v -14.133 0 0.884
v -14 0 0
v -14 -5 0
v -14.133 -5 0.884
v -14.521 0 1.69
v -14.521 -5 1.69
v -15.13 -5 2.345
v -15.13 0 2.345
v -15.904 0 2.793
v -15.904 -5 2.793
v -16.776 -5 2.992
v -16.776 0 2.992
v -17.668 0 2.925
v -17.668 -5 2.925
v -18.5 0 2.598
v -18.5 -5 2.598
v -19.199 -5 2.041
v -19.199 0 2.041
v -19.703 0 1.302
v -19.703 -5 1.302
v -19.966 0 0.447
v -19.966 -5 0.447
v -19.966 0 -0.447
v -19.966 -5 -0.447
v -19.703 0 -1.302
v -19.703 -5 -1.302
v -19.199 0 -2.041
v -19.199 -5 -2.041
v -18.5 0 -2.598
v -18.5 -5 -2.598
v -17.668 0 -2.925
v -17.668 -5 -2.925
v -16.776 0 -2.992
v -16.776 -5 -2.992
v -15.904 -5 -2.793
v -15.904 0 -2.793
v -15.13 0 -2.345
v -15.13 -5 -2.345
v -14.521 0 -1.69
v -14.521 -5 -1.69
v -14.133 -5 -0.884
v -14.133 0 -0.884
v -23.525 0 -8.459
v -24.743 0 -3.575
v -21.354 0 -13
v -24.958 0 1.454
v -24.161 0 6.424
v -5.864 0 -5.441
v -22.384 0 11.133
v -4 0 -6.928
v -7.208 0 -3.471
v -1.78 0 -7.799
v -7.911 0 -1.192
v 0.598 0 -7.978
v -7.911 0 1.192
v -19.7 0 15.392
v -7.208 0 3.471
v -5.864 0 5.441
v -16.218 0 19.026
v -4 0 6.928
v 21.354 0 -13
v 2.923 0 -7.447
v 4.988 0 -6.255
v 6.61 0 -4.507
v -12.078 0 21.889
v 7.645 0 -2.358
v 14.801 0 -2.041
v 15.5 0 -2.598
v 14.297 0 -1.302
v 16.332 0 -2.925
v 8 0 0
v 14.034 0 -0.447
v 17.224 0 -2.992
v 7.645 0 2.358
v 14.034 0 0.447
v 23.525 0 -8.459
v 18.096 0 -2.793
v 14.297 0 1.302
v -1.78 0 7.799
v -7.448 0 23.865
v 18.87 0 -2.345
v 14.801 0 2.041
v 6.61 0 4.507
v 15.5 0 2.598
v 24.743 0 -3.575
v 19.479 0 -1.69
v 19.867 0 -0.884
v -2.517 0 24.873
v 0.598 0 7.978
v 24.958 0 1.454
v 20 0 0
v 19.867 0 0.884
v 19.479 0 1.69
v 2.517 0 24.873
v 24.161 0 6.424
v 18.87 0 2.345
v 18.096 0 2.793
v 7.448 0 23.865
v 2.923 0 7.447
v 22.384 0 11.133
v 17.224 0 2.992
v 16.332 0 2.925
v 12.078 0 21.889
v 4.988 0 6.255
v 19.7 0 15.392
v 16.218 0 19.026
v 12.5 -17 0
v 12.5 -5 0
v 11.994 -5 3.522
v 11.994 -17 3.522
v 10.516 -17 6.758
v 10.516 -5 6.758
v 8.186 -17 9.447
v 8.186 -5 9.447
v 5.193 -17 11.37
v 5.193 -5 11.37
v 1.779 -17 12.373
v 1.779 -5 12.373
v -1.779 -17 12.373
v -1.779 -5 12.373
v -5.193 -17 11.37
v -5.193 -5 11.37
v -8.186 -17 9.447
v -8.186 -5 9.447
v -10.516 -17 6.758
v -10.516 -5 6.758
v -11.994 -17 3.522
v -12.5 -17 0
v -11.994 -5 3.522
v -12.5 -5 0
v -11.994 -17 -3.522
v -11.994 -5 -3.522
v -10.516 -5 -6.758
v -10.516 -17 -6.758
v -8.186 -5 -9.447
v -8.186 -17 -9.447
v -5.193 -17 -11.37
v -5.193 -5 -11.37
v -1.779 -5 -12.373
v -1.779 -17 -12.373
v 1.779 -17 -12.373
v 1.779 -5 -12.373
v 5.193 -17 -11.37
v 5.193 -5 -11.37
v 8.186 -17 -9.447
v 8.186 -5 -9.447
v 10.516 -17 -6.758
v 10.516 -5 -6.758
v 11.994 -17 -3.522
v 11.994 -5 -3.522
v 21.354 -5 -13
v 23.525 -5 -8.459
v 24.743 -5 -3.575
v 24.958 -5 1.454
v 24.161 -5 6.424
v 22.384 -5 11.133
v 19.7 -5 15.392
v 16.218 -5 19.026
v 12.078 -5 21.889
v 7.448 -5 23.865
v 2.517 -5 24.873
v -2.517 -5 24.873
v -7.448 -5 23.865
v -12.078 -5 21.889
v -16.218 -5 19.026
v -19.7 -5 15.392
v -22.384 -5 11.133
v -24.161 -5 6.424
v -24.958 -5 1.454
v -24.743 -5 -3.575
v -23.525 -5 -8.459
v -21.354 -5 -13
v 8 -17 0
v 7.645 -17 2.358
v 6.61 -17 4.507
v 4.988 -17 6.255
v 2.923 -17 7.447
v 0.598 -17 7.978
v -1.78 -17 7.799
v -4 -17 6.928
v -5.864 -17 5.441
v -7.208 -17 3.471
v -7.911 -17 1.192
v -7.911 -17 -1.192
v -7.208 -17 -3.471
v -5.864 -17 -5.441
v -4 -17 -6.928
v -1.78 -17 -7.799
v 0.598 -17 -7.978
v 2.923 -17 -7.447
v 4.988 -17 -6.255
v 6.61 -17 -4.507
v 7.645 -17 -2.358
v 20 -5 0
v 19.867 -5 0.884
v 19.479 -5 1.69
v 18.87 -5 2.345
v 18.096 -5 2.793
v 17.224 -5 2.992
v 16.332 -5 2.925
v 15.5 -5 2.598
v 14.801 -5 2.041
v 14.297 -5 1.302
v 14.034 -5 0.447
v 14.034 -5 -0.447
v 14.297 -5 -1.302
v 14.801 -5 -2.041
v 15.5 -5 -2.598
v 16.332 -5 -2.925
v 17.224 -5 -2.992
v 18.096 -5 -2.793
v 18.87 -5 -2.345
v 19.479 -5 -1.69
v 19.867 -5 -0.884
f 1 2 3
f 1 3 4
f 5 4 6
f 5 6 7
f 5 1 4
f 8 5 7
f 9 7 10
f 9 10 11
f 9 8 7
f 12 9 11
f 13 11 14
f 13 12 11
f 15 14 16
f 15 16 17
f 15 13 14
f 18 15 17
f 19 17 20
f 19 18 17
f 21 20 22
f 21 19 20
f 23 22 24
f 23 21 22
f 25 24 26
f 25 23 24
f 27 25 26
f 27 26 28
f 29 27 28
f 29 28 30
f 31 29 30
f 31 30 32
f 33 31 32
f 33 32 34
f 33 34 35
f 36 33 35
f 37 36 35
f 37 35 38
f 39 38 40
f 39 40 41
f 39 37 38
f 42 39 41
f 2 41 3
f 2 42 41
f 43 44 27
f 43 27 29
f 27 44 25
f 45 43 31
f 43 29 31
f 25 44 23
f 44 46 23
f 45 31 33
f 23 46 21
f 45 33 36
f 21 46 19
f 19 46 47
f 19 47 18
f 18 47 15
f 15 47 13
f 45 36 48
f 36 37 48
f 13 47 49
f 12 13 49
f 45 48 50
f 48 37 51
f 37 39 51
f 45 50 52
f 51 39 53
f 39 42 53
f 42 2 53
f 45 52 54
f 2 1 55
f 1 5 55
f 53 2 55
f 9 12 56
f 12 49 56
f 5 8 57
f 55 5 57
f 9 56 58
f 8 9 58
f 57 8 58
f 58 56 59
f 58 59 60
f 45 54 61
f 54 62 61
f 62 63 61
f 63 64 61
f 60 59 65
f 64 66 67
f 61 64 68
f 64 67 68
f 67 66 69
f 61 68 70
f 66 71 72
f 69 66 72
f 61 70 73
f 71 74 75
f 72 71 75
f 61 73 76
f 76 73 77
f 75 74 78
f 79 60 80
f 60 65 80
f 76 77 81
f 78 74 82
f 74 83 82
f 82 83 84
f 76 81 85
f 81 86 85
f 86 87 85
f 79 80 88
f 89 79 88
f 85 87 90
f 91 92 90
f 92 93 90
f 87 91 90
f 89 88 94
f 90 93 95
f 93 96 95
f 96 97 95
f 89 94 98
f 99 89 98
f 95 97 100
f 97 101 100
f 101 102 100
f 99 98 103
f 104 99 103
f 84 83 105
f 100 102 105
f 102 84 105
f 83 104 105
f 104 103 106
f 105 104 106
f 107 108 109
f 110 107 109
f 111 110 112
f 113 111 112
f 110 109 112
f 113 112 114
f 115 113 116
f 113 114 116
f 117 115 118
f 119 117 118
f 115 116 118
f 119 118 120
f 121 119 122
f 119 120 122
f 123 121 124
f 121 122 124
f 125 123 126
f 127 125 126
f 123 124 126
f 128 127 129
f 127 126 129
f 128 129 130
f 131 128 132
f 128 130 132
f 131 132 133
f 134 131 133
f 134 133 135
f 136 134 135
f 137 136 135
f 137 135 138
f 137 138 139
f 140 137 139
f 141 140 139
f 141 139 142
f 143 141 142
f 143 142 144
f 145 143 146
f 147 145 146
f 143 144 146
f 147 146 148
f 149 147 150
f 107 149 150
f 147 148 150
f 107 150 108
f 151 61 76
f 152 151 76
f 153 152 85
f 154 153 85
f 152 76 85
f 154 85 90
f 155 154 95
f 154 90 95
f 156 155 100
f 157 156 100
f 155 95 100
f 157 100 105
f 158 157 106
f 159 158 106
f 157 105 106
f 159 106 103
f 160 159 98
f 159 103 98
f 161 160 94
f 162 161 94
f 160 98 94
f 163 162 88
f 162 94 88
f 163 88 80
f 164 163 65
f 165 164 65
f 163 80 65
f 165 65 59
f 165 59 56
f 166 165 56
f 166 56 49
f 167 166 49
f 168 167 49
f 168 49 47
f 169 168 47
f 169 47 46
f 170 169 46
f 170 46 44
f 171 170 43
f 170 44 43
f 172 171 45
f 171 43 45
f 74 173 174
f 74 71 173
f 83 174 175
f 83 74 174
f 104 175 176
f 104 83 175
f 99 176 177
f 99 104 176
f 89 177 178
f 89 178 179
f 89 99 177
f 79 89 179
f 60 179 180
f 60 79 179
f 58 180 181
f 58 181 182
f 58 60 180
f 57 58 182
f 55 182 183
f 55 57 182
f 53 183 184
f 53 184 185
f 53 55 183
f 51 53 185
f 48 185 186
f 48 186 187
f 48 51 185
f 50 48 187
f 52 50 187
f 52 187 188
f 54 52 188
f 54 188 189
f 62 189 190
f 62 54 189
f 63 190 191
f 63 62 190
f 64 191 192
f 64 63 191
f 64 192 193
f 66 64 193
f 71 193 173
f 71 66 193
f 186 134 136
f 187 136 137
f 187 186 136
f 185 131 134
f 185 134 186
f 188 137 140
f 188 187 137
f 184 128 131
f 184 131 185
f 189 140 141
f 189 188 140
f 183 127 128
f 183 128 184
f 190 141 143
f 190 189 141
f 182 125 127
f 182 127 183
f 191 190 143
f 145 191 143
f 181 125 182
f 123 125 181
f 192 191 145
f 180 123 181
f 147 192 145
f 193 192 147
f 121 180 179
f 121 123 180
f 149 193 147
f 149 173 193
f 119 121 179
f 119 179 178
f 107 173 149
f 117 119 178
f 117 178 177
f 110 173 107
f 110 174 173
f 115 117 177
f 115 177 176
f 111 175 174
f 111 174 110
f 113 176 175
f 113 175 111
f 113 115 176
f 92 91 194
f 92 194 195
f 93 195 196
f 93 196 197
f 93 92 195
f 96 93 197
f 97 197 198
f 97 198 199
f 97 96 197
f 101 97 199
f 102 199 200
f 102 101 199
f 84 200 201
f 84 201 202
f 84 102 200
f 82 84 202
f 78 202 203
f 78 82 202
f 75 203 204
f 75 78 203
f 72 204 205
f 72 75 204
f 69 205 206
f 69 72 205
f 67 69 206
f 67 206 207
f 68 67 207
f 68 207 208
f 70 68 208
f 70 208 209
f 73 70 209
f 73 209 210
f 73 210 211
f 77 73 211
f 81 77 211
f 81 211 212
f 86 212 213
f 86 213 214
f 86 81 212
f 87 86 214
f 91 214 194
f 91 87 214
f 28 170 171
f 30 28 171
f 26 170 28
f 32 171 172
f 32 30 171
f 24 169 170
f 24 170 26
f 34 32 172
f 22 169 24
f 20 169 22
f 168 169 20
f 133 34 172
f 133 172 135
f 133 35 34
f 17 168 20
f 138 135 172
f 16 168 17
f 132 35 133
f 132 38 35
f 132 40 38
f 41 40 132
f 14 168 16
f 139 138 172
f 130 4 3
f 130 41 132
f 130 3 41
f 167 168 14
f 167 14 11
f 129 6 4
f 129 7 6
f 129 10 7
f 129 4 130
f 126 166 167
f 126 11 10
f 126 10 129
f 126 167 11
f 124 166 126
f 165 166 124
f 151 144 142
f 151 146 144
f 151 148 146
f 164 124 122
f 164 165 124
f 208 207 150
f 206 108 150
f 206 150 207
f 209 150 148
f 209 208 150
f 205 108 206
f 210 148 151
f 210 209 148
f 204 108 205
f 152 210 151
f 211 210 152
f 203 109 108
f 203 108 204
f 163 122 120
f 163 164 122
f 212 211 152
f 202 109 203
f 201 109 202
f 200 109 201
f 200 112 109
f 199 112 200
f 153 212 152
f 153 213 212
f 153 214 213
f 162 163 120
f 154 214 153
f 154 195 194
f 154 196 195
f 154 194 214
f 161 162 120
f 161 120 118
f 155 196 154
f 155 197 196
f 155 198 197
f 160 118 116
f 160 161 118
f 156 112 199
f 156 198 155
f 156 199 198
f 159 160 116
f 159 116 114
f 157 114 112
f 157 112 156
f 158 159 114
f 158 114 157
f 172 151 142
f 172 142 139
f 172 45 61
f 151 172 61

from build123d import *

# Parameters (mm, degrees)
F0_R     = 3
F0_R_2   = 8
F1_DEPTH = 5
F2_R     = 12.5
F2_R_2   = 8
F3_DEPTH = 12


with BuildPart() as f1:
    # F0 (on Front) → F1 (new body)
    with BuildSketch(Plane.XZ):
        with BuildLine():
            Line((-21.354157, -13), (21.354157, -13))
            ThreePointArc((21.354157, -13), (0, 25), (-21.354157, -13))
        make_face()
        with Locations((-17, 0)):
            Circle(F0_R, mode=Mode.SUBTRACT)
        Circle(F0_R_2, mode=Mode.SUBTRACT)
        with Locations((17, 0)):
            Circle(F0_R, mode=Mode.SUBTRACT)
    extrude(amount=F1_DEPTH)

    # F2 (on face) → F3 (join)
    with BuildSketch(Plane.XZ.offset(5)):
        Circle(F2_R)
        Circle(F2_R_2, mode=Mode.SUBTRACT)
    extrude(amount=F3_DEPTH)


solid = f1.part
